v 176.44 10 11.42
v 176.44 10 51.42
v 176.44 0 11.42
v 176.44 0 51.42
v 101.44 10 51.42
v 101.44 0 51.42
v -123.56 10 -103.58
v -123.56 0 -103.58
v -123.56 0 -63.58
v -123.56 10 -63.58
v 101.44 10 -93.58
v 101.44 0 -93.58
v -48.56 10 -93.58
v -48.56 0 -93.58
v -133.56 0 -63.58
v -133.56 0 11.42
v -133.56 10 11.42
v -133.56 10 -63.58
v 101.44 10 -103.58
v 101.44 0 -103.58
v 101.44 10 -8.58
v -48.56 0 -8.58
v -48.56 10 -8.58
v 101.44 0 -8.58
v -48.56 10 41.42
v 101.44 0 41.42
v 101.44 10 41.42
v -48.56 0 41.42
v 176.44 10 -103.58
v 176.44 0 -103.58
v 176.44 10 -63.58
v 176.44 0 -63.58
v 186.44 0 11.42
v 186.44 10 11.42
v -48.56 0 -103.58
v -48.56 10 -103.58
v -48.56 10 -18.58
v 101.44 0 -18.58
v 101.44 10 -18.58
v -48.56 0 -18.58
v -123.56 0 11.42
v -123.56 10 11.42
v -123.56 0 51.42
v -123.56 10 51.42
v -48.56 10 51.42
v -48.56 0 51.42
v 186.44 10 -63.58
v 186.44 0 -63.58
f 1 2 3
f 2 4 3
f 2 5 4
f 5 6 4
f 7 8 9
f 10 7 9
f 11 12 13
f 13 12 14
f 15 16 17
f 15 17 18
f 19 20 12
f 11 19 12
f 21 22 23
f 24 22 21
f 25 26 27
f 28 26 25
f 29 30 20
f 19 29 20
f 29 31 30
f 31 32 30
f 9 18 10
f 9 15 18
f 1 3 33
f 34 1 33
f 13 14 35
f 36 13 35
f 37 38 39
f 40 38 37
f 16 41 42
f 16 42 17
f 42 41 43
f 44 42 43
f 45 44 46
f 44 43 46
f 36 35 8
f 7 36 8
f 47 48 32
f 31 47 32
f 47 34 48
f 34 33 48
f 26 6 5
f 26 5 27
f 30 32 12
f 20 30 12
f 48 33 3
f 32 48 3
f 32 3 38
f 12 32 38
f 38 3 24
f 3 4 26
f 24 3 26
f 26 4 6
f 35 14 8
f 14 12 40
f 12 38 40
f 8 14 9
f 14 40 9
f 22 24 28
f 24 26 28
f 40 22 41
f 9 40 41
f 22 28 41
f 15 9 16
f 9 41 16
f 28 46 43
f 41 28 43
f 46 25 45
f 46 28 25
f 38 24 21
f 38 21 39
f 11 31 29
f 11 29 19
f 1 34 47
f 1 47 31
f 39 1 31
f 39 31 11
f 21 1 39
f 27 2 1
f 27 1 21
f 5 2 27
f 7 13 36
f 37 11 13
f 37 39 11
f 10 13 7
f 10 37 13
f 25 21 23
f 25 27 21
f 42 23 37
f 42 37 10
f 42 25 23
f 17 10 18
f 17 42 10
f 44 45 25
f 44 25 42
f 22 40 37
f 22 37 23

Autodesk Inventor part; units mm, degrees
ref_plane "YZ Plane" through (0, 0, 0) normal (1, 0, 0) x (0, 1, 0)
ref_plane "XZ Plane" through (0, 0, 0) normal (0, 1, 0) x (-1, 0, 0)
ref_plane "XY Plane" through (0, 0, 0) normal (0, 0, 1) x (1, 0, 0)
sketch "Skizze1" plane through (0, 0, 0) normal (0, 1, 0) x (-1, 0, 0)
  line L0 (-101.4396, -103.5796) -> (-101.4396, -93.5796)
  line L1 (-101.4396, -93.5796) -> (48.5604, -93.5796)
  line L2 (48.5604, -93.5796) -> (48.5604, -103.5796)
  line L3 (-176.4396, -103.5796) -> (-101.4396, -103.5796)
  line L4 (48.5604, -103.5796) -> (123.5604, -103.5796)
  line L5 (-101.4396, 51.4204) -> (-101.4396, 41.4204)
  line L6 (-101.4396, 41.4204) -> (48.5604, 41.4204)
  line L7 (48.5604, 41.4204) -> (48.5604, 51.4204)
  line L8 (123.5604, 51.4204) -> (48.5604, 51.4204)
  line L9 (-101.4396, 51.4204) -> (-176.4396, 51.4204)
  line L10 (123.5604, 11.4204) -> (133.5604, 11.4204)
  line L11 (133.5604, 11.4204) -> (133.5604, -63.5796)
  line L12 (133.5604, -63.5796) -> (123.5604, -63.5796)
  line L13 (123.5604, -103.5796) -> (123.5604, -63.5796)
  line L14 (123.5604, 11.4204) -> (123.5604, 51.4204)
  line L15 (48.5604, -8.5796) -> (-101.4396, -8.5796)
  line L16 (-101.4396, -8.5796) -> (-101.4396, -18.5796)
  line L17 (-101.4396, -18.5796) -> (48.5604, -18.5796)
  line L18 (48.5604, -18.5796) -> (48.5604, -8.5796)
  line L19 (-176.4396, 11.4204) -> (-186.4396, 11.4204)
  line L20 (-186.4396, 11.4204) -> (-186.4396, -63.5796)
  line L21 (-186.4396, -63.5796) -> (-176.4396, -63.5796)
  line L22 (-176.4396, 51.4204) -> (-176.4396, 11.4204)
  line L23 (-176.4396, -63.5796) -> (-176.4396, -103.5796)
  dimension "d0" = 300
  dimension "d2" = 150
  dimension "d3" = 10
  dimension "d6" = 10
  dimension "d7" = 10
  dimension "d8" = 75
  dimension "d10" = 150
  dimension "d11" = 10
  dimension "d13" = 10
  dimension "d14" = 75
  dimension "d17" = 10
  dimension "d20" = 10
  dimension "d22" = 50
  dimension "d25" = 155
  dimension "d26" = 0
  dimension "d27" = 10
  dimension "d28" = 40
  dimension "d29" = 40
  dimension "d30" = 85
  dimension "d31" = 75
  dimension "d32" = 85
  dimension "d33" = 75
  dimension "d34" = 10
  dimension "d35" = 150
extrude "Extrusion1" add sketch "Skizze1" along normal blind 10
properties part number "Platte3-Seite"
